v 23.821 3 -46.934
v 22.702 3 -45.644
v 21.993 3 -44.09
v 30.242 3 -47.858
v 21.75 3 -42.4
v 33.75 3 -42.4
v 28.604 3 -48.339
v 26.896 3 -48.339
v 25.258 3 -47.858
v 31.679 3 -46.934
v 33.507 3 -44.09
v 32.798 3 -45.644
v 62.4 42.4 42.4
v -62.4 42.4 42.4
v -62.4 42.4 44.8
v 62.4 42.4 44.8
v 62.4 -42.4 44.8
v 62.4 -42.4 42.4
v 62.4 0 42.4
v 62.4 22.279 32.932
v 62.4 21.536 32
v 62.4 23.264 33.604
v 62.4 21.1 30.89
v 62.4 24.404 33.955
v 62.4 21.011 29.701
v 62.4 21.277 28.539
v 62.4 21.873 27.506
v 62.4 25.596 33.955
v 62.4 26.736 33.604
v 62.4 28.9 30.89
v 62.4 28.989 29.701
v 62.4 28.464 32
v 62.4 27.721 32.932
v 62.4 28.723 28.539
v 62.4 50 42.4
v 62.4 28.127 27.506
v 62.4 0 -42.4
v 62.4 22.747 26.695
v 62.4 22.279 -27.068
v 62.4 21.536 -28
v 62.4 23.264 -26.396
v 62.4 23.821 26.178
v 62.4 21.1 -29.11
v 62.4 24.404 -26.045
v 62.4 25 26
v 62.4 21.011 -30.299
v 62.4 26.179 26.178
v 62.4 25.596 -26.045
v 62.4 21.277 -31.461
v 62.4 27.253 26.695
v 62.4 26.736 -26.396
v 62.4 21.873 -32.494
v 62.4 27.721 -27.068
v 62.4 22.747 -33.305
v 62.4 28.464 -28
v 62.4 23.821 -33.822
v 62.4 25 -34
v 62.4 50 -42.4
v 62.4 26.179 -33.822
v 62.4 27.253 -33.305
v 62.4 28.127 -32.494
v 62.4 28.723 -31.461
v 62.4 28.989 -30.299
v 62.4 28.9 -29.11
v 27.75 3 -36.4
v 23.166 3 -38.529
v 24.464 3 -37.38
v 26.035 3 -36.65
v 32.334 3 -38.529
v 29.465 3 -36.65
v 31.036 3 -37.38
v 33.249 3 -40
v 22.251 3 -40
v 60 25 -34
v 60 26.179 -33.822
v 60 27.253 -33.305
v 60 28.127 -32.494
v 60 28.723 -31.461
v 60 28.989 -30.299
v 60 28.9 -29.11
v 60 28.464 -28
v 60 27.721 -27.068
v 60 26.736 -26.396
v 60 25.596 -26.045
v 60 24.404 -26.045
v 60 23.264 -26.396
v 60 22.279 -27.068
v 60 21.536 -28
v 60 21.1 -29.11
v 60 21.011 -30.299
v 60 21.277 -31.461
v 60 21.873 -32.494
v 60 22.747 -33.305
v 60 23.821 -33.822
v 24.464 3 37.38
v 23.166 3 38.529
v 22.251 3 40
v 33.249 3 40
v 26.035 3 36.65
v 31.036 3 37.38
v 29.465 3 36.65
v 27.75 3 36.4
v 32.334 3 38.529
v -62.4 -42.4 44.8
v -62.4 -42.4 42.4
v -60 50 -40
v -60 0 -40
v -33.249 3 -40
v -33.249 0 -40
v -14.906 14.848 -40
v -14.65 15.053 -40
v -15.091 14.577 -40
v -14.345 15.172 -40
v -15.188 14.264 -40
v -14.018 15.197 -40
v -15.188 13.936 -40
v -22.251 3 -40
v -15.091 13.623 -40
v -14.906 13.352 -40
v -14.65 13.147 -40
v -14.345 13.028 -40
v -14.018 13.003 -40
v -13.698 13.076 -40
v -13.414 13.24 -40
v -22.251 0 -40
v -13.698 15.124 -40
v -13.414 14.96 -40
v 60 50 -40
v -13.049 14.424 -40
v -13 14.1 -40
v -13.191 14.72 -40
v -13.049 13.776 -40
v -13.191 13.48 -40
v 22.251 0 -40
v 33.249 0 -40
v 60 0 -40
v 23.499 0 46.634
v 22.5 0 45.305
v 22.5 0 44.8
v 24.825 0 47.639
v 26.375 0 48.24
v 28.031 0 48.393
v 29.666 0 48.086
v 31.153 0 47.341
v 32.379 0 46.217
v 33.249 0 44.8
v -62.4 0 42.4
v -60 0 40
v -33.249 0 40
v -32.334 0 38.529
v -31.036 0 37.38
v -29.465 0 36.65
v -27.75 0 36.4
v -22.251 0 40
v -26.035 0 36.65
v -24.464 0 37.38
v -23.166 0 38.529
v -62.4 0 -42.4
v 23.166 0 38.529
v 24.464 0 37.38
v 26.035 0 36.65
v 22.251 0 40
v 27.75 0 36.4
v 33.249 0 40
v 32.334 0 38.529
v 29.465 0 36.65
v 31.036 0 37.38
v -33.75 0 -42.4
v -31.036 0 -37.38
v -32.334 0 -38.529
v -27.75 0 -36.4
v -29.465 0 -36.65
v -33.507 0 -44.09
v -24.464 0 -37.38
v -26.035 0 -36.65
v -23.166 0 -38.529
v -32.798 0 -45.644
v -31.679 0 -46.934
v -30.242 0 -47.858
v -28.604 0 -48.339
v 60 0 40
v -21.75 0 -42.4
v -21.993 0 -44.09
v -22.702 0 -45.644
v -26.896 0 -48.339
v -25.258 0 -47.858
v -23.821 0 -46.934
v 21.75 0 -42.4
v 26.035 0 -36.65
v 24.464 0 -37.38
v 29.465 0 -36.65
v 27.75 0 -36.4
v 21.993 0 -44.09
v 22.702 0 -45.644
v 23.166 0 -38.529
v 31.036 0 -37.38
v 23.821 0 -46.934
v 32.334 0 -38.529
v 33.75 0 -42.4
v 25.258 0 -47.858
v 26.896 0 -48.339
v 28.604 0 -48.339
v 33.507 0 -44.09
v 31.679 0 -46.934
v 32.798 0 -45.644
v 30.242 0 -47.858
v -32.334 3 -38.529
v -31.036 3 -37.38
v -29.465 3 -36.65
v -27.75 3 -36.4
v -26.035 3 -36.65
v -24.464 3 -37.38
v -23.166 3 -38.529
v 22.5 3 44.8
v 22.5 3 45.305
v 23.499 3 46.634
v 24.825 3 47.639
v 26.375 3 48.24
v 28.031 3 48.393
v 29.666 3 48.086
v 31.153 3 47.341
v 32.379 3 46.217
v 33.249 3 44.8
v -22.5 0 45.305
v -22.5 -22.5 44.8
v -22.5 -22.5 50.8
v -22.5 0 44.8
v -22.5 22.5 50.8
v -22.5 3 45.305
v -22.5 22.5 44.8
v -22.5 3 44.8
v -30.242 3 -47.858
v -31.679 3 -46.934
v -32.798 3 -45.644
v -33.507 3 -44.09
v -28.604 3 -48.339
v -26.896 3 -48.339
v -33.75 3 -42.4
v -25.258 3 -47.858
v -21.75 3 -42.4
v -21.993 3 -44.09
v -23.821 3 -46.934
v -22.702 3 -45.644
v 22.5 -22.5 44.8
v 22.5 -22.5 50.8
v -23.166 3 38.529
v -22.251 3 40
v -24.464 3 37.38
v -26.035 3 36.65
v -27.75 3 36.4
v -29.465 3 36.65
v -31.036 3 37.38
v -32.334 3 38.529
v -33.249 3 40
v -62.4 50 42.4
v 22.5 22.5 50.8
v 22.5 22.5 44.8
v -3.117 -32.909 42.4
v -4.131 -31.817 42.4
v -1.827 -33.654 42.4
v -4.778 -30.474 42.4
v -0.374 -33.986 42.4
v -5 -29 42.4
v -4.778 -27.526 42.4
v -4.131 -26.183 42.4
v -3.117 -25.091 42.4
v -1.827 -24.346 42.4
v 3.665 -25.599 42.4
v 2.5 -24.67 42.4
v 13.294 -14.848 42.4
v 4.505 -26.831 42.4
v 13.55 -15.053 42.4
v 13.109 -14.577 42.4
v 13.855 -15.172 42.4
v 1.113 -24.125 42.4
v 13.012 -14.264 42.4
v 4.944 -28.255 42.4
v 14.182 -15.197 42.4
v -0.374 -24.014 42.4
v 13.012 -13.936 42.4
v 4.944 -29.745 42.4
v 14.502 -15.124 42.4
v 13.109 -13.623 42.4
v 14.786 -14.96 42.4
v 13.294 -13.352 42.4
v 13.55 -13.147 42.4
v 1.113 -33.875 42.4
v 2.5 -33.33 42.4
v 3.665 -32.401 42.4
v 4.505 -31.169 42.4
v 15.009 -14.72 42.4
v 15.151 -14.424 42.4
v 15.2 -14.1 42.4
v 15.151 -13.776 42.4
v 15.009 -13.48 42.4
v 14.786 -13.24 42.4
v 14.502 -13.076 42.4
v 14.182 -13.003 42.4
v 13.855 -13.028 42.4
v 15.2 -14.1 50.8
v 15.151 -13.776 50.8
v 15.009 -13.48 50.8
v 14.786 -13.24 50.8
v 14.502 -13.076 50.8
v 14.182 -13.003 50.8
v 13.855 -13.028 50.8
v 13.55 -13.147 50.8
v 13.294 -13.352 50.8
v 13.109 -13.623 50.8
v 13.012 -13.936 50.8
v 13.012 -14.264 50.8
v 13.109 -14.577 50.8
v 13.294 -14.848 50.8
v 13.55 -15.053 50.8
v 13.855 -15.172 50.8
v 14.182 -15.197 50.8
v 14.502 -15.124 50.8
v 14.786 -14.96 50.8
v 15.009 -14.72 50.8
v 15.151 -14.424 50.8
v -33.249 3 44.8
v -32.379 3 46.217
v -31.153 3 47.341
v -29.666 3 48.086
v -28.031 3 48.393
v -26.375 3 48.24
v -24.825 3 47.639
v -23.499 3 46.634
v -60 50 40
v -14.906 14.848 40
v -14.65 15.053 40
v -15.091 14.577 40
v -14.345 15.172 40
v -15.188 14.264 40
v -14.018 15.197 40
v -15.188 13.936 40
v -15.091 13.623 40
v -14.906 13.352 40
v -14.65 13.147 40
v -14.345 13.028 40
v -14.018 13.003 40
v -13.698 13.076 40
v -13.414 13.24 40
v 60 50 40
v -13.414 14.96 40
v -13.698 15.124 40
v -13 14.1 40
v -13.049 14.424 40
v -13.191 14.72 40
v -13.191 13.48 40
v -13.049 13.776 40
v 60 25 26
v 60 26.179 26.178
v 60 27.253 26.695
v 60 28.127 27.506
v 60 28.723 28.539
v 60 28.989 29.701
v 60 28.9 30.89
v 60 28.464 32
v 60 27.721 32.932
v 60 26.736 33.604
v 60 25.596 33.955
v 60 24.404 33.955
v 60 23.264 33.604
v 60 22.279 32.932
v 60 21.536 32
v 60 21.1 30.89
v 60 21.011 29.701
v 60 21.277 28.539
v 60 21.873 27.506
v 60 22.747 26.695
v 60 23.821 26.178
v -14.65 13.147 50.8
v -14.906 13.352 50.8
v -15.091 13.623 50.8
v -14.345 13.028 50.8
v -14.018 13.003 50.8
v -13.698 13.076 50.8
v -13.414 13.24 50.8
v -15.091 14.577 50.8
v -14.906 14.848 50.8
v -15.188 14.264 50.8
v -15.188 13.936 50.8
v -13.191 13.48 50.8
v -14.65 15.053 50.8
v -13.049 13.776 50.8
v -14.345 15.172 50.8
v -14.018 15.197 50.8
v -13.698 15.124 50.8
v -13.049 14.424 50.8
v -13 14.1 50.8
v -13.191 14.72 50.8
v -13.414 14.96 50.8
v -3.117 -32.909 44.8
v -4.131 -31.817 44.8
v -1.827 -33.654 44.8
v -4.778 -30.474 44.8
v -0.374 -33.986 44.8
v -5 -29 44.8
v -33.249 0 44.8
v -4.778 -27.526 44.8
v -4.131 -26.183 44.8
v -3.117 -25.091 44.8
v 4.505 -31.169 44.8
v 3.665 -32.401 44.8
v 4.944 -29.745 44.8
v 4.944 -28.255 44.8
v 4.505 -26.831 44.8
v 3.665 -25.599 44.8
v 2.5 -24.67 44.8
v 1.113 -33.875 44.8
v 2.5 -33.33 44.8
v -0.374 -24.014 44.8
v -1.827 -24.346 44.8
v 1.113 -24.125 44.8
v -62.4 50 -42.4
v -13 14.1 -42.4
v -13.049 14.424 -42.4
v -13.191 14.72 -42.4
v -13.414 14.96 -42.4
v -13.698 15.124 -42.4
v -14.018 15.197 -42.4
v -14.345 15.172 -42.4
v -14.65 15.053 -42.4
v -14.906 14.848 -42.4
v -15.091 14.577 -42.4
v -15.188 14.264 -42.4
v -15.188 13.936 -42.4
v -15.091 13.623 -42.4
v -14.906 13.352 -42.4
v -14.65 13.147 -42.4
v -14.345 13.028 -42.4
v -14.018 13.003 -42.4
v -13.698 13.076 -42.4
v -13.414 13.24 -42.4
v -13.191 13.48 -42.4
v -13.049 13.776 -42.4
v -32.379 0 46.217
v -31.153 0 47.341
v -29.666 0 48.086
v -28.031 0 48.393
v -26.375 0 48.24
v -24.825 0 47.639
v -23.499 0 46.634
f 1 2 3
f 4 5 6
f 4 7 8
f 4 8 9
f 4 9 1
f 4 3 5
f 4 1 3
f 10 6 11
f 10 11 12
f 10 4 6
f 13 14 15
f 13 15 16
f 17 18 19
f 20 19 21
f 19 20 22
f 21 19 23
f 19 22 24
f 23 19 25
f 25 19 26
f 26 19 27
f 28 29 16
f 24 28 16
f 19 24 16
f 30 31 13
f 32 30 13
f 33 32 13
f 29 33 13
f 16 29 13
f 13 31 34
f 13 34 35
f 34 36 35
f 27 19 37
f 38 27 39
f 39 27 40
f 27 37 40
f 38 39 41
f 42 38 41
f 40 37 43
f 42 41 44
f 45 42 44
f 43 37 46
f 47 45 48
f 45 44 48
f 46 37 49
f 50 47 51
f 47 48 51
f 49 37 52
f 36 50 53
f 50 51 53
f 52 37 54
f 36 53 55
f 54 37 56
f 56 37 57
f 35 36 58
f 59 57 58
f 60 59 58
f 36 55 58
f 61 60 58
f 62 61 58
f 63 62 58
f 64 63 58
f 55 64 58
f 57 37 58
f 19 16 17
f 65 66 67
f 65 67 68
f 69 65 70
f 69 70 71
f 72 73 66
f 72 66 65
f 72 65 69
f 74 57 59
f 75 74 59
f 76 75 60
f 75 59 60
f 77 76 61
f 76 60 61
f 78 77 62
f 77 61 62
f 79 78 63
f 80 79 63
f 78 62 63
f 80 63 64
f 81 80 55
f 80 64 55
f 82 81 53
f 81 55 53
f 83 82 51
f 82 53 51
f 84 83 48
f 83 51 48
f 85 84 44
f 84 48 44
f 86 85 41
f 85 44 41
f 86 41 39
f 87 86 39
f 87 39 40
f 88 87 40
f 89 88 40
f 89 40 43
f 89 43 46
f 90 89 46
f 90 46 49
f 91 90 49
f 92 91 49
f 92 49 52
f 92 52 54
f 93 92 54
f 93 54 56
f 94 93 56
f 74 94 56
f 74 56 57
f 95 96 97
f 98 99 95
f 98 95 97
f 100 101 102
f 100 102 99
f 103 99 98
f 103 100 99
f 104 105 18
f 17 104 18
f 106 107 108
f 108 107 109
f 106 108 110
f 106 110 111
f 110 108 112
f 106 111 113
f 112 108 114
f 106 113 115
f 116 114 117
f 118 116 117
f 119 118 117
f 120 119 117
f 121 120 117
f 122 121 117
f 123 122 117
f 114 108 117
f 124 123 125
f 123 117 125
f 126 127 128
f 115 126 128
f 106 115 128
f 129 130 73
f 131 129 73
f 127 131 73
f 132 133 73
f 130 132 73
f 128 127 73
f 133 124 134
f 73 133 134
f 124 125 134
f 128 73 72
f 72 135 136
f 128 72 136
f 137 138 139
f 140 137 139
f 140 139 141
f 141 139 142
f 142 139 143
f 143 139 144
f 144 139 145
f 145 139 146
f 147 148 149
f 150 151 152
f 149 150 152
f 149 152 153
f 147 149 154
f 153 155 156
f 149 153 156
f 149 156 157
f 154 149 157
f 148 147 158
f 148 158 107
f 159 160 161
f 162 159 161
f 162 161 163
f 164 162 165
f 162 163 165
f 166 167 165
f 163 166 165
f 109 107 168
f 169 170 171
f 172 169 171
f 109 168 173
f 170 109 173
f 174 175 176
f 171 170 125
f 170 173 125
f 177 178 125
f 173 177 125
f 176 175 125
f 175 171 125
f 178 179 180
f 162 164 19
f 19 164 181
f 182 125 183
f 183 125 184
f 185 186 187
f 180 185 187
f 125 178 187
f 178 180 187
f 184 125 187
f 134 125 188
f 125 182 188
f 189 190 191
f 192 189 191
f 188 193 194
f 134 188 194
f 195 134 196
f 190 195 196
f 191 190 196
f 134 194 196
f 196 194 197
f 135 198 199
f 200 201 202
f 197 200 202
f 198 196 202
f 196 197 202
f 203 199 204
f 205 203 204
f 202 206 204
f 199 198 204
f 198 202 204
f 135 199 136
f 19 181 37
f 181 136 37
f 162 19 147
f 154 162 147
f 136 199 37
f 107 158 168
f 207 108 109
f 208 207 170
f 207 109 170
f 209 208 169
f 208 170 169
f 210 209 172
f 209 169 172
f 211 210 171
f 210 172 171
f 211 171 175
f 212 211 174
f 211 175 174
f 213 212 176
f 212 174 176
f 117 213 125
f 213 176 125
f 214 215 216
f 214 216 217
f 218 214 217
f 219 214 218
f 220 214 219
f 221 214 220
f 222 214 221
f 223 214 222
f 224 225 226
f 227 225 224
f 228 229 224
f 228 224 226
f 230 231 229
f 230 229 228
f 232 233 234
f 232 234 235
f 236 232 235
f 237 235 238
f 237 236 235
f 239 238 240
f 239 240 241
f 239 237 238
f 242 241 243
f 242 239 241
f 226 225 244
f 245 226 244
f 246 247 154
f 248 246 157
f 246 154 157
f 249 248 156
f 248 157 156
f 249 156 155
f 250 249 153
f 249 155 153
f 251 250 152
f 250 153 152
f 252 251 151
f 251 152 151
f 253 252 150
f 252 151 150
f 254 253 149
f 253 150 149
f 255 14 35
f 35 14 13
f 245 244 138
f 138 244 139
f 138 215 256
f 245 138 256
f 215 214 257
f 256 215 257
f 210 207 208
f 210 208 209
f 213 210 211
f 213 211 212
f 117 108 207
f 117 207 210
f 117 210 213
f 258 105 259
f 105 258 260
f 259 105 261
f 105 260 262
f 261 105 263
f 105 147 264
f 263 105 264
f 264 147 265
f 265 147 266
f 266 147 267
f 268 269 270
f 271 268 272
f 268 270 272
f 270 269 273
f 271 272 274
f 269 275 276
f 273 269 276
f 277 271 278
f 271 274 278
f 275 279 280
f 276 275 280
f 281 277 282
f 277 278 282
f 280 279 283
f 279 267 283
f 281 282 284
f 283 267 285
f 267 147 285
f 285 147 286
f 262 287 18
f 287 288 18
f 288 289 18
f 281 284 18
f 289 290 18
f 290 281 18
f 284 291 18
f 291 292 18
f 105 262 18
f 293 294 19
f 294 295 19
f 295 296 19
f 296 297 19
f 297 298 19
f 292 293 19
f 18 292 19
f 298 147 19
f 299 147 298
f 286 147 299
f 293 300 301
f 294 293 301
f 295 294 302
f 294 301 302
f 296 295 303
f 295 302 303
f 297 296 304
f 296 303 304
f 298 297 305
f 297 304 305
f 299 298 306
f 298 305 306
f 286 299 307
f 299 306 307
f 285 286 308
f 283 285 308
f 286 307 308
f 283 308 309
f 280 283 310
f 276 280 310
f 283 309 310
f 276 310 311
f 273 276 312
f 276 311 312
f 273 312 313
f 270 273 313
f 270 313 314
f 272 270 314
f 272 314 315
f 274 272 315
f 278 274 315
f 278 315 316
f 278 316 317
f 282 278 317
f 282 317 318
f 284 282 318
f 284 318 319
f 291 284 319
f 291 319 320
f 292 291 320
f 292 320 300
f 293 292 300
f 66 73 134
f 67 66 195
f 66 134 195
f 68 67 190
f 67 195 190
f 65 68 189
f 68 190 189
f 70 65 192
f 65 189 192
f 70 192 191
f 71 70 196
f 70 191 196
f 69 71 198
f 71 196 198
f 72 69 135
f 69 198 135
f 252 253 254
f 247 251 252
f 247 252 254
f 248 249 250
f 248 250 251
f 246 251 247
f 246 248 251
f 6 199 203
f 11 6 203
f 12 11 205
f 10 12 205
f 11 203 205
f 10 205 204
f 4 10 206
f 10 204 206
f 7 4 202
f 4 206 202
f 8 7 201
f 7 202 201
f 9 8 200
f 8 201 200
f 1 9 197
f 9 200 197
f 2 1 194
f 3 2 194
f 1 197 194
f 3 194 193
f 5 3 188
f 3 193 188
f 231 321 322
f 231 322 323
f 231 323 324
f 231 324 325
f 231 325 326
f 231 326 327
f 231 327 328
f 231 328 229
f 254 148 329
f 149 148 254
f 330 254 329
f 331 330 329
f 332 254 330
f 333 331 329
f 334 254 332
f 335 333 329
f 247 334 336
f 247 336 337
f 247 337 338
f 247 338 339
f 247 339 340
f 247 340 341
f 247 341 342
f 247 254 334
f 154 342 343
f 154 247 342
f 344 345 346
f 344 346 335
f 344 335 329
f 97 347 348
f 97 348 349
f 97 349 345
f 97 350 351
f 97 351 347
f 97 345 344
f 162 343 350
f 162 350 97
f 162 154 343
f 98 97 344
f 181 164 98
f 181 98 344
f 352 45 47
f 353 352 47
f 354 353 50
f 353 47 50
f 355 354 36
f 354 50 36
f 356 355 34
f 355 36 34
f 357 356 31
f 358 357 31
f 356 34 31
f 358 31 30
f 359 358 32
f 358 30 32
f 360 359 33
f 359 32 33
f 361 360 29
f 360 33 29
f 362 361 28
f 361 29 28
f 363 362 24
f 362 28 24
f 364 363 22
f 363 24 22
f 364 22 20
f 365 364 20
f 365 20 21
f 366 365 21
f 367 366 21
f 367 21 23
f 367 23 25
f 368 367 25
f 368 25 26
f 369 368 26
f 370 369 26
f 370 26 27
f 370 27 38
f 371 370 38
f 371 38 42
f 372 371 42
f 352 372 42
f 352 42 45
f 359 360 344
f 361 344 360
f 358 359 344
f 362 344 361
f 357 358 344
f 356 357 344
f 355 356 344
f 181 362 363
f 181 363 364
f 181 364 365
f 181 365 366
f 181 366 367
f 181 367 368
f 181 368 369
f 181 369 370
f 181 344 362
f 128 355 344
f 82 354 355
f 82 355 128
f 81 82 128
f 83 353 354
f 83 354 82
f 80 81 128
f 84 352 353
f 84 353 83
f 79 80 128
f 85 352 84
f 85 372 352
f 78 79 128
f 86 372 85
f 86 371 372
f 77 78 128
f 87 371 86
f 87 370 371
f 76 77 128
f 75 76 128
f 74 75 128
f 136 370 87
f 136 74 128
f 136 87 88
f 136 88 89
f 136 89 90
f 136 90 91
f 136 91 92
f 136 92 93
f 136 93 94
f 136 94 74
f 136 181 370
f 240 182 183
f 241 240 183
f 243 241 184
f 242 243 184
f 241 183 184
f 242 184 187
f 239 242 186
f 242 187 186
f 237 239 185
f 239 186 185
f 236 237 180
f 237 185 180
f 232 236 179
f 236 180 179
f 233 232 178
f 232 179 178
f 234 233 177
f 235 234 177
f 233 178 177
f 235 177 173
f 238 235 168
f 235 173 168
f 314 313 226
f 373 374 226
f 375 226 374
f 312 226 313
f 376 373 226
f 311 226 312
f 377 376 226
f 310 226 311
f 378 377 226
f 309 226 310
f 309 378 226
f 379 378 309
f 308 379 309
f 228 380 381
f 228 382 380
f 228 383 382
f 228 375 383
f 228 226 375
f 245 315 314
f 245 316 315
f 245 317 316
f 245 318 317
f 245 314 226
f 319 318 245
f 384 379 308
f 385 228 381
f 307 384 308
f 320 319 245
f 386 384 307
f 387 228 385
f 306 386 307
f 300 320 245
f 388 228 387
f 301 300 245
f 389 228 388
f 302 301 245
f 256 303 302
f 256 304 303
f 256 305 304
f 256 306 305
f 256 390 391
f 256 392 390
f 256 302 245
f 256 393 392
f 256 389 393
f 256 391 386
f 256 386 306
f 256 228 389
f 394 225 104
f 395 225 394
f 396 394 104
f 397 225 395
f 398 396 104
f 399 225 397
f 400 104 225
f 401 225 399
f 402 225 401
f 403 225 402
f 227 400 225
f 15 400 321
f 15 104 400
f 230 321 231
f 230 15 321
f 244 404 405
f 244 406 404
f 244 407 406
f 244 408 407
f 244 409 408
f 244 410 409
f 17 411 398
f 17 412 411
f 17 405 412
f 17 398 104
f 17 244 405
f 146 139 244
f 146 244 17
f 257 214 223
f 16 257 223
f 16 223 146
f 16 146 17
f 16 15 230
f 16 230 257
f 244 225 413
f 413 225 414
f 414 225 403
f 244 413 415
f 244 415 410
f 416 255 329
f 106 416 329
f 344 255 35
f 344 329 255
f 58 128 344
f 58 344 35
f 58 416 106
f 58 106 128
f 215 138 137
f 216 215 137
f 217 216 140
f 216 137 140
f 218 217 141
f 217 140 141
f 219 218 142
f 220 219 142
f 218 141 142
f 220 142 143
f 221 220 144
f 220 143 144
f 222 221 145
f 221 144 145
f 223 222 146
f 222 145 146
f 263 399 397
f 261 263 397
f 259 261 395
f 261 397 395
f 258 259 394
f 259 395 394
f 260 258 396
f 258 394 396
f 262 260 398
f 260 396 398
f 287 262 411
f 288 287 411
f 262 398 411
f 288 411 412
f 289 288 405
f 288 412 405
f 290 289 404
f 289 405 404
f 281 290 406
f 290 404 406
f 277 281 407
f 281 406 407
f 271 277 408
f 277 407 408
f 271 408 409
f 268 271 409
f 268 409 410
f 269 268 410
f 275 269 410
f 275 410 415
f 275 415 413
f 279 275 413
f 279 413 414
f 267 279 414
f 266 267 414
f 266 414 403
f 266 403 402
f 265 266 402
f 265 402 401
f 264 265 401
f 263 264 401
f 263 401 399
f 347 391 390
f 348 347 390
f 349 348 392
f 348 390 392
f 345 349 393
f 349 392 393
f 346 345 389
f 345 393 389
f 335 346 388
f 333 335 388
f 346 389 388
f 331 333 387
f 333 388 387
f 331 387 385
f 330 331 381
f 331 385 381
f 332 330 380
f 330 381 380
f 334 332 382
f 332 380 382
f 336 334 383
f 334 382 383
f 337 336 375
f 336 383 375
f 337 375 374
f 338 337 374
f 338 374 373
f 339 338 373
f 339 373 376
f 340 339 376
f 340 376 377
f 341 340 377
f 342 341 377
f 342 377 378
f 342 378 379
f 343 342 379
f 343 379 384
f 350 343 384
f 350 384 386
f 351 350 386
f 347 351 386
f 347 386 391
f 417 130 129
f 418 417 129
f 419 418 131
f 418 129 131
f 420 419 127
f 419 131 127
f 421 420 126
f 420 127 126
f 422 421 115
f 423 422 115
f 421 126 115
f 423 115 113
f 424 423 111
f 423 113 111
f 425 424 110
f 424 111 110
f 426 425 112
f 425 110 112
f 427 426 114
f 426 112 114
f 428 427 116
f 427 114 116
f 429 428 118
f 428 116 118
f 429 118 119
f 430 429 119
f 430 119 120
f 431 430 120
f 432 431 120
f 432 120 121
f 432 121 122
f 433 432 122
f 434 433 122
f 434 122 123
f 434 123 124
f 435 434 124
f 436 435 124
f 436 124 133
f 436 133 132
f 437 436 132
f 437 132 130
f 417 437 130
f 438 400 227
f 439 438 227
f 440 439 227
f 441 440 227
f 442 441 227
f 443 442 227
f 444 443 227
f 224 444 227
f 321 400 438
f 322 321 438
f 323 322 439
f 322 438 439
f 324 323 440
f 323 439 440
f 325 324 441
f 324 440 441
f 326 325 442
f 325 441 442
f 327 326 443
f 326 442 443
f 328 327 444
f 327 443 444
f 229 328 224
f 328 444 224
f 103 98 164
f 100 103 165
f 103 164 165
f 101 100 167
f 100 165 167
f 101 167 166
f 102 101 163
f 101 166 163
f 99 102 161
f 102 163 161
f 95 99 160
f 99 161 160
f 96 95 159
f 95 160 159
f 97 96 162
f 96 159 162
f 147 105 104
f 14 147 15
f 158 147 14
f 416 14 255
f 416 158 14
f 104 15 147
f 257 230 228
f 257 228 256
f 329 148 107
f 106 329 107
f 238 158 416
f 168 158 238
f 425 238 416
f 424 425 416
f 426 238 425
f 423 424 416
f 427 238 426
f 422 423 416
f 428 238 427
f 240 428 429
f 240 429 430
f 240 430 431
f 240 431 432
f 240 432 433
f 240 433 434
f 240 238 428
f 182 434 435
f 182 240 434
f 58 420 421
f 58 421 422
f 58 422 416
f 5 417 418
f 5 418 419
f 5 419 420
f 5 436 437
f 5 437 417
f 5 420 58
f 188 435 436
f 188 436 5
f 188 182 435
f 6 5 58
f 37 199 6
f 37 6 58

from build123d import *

# Parameters (mm, degrees)
SKETCH1_W           = 124.8
SKETCH1_H           = 84.8
SKETCH1_W_2         = 120
SKETCH1_H_2         = 80
BOSS_EXTRUDE1_DEPTH = 50
SKETCH2_W           = 124.8
SKETCH2_H           = 84.8
BOSS_EXTRUDE2_DEPTH = 2.4
SKETCH3_W           = 45
SKETCH3_H           = 45
BOSS_EXTRUDE3_DEPTH = 6
SKETCH4_R           = 1.1
SKETCH4_R_2         = 5
CUT_EXTRUDE1_DEPTH  = 123.800651464
SKETCH5_R           = 4
CUT_EXTRUDE2_DEPTH  = 3
SKETCH6_R           = 6
BOSS_EXTRUDE4_DEPTH = 3


with BuildPart() as part:
    # Sketch1 → Boss-Extrude1 (new body)
    with BuildSketch(Plane(origin=(0, 0, 0), x_dir=(1, 0, 0), z_dir=(0, 1, 0))):
        Rectangle(SKETCH1_W, SKETCH1_H)
        Rectangle(SKETCH1_W_2, SKETCH1_H_2, mode=Mode.SUBTRACT)
    extrude(amount=BOSS_EXTRUDE1_DEPTH)

    # Sketch2 → Boss-Extrude2 (add)
    with BuildSketch(Plane.XY.offset(42.4)):
        Rectangle(SKETCH2_W, SKETCH2_H)
    extrude(amount=BOSS_EXTRUDE2_DEPTH)

    # Sketch3 → Boss-Extrude3 (add)
    with BuildSketch(Plane.XY.offset(44.8)):
        Rectangle(SKETCH3_W, SKETCH3_H)
    extrude(amount=BOSS_EXTRUDE3_DEPTH)

    # Sketch4 → Cut-Extrude1 (cut, through all)
    with BuildSketch(Plane.XY.offset(50.8)):
        with Locations((-14.1, 14.1)):
            Circle(SKETCH4_R)
        with Locations((14.1, -14.1)):
            Circle(SKETCH4_R)
        with Locations(Location((0, -29, 0), (0, 0, 180))):
            Circle(SKETCH4_R_2)
    extrude(amount=-CUT_EXTRUDE1_DEPTH, mode=Mode.SUBTRACT)

    # Sketch5 → Cut-Extrude2 (cut)
    with BuildSketch(Plane(origin=(62.4, 0, 0), x_dir=(0, 0, -1), z_dir=(1, 0, 0))):
        with Locations((-30, 25)):
            Circle(SKETCH5_R)
        with Locations((30, 25)):
            Circle(SKETCH5_R)
    extrude(amount=-CUT_EXTRUDE2_DEPTH, mode=Mode.SUBTRACT)

    # Sketch6 → Boss-Extrude4 (add)
    with BuildSketch(Plane(origin=(0, 0, 0), x_dir=(1, 0, 0), z_dir=(0, 1, 0))):
        with Locations((-27.75, -42.4)):
            Circle(SKETCH6_R)
        with Locations((27.75, -42.4)):
            Circle(SKETCH6_R)
        with Locations((-27.75, 42.4)):
            Circle(SKETCH6_R)
        with Locations((27.75, 42.4)):
            Circle(SKETCH6_R)
    extrude(amount=BOSS_EXTRUDE4_DEPTH)


solid = part.part
